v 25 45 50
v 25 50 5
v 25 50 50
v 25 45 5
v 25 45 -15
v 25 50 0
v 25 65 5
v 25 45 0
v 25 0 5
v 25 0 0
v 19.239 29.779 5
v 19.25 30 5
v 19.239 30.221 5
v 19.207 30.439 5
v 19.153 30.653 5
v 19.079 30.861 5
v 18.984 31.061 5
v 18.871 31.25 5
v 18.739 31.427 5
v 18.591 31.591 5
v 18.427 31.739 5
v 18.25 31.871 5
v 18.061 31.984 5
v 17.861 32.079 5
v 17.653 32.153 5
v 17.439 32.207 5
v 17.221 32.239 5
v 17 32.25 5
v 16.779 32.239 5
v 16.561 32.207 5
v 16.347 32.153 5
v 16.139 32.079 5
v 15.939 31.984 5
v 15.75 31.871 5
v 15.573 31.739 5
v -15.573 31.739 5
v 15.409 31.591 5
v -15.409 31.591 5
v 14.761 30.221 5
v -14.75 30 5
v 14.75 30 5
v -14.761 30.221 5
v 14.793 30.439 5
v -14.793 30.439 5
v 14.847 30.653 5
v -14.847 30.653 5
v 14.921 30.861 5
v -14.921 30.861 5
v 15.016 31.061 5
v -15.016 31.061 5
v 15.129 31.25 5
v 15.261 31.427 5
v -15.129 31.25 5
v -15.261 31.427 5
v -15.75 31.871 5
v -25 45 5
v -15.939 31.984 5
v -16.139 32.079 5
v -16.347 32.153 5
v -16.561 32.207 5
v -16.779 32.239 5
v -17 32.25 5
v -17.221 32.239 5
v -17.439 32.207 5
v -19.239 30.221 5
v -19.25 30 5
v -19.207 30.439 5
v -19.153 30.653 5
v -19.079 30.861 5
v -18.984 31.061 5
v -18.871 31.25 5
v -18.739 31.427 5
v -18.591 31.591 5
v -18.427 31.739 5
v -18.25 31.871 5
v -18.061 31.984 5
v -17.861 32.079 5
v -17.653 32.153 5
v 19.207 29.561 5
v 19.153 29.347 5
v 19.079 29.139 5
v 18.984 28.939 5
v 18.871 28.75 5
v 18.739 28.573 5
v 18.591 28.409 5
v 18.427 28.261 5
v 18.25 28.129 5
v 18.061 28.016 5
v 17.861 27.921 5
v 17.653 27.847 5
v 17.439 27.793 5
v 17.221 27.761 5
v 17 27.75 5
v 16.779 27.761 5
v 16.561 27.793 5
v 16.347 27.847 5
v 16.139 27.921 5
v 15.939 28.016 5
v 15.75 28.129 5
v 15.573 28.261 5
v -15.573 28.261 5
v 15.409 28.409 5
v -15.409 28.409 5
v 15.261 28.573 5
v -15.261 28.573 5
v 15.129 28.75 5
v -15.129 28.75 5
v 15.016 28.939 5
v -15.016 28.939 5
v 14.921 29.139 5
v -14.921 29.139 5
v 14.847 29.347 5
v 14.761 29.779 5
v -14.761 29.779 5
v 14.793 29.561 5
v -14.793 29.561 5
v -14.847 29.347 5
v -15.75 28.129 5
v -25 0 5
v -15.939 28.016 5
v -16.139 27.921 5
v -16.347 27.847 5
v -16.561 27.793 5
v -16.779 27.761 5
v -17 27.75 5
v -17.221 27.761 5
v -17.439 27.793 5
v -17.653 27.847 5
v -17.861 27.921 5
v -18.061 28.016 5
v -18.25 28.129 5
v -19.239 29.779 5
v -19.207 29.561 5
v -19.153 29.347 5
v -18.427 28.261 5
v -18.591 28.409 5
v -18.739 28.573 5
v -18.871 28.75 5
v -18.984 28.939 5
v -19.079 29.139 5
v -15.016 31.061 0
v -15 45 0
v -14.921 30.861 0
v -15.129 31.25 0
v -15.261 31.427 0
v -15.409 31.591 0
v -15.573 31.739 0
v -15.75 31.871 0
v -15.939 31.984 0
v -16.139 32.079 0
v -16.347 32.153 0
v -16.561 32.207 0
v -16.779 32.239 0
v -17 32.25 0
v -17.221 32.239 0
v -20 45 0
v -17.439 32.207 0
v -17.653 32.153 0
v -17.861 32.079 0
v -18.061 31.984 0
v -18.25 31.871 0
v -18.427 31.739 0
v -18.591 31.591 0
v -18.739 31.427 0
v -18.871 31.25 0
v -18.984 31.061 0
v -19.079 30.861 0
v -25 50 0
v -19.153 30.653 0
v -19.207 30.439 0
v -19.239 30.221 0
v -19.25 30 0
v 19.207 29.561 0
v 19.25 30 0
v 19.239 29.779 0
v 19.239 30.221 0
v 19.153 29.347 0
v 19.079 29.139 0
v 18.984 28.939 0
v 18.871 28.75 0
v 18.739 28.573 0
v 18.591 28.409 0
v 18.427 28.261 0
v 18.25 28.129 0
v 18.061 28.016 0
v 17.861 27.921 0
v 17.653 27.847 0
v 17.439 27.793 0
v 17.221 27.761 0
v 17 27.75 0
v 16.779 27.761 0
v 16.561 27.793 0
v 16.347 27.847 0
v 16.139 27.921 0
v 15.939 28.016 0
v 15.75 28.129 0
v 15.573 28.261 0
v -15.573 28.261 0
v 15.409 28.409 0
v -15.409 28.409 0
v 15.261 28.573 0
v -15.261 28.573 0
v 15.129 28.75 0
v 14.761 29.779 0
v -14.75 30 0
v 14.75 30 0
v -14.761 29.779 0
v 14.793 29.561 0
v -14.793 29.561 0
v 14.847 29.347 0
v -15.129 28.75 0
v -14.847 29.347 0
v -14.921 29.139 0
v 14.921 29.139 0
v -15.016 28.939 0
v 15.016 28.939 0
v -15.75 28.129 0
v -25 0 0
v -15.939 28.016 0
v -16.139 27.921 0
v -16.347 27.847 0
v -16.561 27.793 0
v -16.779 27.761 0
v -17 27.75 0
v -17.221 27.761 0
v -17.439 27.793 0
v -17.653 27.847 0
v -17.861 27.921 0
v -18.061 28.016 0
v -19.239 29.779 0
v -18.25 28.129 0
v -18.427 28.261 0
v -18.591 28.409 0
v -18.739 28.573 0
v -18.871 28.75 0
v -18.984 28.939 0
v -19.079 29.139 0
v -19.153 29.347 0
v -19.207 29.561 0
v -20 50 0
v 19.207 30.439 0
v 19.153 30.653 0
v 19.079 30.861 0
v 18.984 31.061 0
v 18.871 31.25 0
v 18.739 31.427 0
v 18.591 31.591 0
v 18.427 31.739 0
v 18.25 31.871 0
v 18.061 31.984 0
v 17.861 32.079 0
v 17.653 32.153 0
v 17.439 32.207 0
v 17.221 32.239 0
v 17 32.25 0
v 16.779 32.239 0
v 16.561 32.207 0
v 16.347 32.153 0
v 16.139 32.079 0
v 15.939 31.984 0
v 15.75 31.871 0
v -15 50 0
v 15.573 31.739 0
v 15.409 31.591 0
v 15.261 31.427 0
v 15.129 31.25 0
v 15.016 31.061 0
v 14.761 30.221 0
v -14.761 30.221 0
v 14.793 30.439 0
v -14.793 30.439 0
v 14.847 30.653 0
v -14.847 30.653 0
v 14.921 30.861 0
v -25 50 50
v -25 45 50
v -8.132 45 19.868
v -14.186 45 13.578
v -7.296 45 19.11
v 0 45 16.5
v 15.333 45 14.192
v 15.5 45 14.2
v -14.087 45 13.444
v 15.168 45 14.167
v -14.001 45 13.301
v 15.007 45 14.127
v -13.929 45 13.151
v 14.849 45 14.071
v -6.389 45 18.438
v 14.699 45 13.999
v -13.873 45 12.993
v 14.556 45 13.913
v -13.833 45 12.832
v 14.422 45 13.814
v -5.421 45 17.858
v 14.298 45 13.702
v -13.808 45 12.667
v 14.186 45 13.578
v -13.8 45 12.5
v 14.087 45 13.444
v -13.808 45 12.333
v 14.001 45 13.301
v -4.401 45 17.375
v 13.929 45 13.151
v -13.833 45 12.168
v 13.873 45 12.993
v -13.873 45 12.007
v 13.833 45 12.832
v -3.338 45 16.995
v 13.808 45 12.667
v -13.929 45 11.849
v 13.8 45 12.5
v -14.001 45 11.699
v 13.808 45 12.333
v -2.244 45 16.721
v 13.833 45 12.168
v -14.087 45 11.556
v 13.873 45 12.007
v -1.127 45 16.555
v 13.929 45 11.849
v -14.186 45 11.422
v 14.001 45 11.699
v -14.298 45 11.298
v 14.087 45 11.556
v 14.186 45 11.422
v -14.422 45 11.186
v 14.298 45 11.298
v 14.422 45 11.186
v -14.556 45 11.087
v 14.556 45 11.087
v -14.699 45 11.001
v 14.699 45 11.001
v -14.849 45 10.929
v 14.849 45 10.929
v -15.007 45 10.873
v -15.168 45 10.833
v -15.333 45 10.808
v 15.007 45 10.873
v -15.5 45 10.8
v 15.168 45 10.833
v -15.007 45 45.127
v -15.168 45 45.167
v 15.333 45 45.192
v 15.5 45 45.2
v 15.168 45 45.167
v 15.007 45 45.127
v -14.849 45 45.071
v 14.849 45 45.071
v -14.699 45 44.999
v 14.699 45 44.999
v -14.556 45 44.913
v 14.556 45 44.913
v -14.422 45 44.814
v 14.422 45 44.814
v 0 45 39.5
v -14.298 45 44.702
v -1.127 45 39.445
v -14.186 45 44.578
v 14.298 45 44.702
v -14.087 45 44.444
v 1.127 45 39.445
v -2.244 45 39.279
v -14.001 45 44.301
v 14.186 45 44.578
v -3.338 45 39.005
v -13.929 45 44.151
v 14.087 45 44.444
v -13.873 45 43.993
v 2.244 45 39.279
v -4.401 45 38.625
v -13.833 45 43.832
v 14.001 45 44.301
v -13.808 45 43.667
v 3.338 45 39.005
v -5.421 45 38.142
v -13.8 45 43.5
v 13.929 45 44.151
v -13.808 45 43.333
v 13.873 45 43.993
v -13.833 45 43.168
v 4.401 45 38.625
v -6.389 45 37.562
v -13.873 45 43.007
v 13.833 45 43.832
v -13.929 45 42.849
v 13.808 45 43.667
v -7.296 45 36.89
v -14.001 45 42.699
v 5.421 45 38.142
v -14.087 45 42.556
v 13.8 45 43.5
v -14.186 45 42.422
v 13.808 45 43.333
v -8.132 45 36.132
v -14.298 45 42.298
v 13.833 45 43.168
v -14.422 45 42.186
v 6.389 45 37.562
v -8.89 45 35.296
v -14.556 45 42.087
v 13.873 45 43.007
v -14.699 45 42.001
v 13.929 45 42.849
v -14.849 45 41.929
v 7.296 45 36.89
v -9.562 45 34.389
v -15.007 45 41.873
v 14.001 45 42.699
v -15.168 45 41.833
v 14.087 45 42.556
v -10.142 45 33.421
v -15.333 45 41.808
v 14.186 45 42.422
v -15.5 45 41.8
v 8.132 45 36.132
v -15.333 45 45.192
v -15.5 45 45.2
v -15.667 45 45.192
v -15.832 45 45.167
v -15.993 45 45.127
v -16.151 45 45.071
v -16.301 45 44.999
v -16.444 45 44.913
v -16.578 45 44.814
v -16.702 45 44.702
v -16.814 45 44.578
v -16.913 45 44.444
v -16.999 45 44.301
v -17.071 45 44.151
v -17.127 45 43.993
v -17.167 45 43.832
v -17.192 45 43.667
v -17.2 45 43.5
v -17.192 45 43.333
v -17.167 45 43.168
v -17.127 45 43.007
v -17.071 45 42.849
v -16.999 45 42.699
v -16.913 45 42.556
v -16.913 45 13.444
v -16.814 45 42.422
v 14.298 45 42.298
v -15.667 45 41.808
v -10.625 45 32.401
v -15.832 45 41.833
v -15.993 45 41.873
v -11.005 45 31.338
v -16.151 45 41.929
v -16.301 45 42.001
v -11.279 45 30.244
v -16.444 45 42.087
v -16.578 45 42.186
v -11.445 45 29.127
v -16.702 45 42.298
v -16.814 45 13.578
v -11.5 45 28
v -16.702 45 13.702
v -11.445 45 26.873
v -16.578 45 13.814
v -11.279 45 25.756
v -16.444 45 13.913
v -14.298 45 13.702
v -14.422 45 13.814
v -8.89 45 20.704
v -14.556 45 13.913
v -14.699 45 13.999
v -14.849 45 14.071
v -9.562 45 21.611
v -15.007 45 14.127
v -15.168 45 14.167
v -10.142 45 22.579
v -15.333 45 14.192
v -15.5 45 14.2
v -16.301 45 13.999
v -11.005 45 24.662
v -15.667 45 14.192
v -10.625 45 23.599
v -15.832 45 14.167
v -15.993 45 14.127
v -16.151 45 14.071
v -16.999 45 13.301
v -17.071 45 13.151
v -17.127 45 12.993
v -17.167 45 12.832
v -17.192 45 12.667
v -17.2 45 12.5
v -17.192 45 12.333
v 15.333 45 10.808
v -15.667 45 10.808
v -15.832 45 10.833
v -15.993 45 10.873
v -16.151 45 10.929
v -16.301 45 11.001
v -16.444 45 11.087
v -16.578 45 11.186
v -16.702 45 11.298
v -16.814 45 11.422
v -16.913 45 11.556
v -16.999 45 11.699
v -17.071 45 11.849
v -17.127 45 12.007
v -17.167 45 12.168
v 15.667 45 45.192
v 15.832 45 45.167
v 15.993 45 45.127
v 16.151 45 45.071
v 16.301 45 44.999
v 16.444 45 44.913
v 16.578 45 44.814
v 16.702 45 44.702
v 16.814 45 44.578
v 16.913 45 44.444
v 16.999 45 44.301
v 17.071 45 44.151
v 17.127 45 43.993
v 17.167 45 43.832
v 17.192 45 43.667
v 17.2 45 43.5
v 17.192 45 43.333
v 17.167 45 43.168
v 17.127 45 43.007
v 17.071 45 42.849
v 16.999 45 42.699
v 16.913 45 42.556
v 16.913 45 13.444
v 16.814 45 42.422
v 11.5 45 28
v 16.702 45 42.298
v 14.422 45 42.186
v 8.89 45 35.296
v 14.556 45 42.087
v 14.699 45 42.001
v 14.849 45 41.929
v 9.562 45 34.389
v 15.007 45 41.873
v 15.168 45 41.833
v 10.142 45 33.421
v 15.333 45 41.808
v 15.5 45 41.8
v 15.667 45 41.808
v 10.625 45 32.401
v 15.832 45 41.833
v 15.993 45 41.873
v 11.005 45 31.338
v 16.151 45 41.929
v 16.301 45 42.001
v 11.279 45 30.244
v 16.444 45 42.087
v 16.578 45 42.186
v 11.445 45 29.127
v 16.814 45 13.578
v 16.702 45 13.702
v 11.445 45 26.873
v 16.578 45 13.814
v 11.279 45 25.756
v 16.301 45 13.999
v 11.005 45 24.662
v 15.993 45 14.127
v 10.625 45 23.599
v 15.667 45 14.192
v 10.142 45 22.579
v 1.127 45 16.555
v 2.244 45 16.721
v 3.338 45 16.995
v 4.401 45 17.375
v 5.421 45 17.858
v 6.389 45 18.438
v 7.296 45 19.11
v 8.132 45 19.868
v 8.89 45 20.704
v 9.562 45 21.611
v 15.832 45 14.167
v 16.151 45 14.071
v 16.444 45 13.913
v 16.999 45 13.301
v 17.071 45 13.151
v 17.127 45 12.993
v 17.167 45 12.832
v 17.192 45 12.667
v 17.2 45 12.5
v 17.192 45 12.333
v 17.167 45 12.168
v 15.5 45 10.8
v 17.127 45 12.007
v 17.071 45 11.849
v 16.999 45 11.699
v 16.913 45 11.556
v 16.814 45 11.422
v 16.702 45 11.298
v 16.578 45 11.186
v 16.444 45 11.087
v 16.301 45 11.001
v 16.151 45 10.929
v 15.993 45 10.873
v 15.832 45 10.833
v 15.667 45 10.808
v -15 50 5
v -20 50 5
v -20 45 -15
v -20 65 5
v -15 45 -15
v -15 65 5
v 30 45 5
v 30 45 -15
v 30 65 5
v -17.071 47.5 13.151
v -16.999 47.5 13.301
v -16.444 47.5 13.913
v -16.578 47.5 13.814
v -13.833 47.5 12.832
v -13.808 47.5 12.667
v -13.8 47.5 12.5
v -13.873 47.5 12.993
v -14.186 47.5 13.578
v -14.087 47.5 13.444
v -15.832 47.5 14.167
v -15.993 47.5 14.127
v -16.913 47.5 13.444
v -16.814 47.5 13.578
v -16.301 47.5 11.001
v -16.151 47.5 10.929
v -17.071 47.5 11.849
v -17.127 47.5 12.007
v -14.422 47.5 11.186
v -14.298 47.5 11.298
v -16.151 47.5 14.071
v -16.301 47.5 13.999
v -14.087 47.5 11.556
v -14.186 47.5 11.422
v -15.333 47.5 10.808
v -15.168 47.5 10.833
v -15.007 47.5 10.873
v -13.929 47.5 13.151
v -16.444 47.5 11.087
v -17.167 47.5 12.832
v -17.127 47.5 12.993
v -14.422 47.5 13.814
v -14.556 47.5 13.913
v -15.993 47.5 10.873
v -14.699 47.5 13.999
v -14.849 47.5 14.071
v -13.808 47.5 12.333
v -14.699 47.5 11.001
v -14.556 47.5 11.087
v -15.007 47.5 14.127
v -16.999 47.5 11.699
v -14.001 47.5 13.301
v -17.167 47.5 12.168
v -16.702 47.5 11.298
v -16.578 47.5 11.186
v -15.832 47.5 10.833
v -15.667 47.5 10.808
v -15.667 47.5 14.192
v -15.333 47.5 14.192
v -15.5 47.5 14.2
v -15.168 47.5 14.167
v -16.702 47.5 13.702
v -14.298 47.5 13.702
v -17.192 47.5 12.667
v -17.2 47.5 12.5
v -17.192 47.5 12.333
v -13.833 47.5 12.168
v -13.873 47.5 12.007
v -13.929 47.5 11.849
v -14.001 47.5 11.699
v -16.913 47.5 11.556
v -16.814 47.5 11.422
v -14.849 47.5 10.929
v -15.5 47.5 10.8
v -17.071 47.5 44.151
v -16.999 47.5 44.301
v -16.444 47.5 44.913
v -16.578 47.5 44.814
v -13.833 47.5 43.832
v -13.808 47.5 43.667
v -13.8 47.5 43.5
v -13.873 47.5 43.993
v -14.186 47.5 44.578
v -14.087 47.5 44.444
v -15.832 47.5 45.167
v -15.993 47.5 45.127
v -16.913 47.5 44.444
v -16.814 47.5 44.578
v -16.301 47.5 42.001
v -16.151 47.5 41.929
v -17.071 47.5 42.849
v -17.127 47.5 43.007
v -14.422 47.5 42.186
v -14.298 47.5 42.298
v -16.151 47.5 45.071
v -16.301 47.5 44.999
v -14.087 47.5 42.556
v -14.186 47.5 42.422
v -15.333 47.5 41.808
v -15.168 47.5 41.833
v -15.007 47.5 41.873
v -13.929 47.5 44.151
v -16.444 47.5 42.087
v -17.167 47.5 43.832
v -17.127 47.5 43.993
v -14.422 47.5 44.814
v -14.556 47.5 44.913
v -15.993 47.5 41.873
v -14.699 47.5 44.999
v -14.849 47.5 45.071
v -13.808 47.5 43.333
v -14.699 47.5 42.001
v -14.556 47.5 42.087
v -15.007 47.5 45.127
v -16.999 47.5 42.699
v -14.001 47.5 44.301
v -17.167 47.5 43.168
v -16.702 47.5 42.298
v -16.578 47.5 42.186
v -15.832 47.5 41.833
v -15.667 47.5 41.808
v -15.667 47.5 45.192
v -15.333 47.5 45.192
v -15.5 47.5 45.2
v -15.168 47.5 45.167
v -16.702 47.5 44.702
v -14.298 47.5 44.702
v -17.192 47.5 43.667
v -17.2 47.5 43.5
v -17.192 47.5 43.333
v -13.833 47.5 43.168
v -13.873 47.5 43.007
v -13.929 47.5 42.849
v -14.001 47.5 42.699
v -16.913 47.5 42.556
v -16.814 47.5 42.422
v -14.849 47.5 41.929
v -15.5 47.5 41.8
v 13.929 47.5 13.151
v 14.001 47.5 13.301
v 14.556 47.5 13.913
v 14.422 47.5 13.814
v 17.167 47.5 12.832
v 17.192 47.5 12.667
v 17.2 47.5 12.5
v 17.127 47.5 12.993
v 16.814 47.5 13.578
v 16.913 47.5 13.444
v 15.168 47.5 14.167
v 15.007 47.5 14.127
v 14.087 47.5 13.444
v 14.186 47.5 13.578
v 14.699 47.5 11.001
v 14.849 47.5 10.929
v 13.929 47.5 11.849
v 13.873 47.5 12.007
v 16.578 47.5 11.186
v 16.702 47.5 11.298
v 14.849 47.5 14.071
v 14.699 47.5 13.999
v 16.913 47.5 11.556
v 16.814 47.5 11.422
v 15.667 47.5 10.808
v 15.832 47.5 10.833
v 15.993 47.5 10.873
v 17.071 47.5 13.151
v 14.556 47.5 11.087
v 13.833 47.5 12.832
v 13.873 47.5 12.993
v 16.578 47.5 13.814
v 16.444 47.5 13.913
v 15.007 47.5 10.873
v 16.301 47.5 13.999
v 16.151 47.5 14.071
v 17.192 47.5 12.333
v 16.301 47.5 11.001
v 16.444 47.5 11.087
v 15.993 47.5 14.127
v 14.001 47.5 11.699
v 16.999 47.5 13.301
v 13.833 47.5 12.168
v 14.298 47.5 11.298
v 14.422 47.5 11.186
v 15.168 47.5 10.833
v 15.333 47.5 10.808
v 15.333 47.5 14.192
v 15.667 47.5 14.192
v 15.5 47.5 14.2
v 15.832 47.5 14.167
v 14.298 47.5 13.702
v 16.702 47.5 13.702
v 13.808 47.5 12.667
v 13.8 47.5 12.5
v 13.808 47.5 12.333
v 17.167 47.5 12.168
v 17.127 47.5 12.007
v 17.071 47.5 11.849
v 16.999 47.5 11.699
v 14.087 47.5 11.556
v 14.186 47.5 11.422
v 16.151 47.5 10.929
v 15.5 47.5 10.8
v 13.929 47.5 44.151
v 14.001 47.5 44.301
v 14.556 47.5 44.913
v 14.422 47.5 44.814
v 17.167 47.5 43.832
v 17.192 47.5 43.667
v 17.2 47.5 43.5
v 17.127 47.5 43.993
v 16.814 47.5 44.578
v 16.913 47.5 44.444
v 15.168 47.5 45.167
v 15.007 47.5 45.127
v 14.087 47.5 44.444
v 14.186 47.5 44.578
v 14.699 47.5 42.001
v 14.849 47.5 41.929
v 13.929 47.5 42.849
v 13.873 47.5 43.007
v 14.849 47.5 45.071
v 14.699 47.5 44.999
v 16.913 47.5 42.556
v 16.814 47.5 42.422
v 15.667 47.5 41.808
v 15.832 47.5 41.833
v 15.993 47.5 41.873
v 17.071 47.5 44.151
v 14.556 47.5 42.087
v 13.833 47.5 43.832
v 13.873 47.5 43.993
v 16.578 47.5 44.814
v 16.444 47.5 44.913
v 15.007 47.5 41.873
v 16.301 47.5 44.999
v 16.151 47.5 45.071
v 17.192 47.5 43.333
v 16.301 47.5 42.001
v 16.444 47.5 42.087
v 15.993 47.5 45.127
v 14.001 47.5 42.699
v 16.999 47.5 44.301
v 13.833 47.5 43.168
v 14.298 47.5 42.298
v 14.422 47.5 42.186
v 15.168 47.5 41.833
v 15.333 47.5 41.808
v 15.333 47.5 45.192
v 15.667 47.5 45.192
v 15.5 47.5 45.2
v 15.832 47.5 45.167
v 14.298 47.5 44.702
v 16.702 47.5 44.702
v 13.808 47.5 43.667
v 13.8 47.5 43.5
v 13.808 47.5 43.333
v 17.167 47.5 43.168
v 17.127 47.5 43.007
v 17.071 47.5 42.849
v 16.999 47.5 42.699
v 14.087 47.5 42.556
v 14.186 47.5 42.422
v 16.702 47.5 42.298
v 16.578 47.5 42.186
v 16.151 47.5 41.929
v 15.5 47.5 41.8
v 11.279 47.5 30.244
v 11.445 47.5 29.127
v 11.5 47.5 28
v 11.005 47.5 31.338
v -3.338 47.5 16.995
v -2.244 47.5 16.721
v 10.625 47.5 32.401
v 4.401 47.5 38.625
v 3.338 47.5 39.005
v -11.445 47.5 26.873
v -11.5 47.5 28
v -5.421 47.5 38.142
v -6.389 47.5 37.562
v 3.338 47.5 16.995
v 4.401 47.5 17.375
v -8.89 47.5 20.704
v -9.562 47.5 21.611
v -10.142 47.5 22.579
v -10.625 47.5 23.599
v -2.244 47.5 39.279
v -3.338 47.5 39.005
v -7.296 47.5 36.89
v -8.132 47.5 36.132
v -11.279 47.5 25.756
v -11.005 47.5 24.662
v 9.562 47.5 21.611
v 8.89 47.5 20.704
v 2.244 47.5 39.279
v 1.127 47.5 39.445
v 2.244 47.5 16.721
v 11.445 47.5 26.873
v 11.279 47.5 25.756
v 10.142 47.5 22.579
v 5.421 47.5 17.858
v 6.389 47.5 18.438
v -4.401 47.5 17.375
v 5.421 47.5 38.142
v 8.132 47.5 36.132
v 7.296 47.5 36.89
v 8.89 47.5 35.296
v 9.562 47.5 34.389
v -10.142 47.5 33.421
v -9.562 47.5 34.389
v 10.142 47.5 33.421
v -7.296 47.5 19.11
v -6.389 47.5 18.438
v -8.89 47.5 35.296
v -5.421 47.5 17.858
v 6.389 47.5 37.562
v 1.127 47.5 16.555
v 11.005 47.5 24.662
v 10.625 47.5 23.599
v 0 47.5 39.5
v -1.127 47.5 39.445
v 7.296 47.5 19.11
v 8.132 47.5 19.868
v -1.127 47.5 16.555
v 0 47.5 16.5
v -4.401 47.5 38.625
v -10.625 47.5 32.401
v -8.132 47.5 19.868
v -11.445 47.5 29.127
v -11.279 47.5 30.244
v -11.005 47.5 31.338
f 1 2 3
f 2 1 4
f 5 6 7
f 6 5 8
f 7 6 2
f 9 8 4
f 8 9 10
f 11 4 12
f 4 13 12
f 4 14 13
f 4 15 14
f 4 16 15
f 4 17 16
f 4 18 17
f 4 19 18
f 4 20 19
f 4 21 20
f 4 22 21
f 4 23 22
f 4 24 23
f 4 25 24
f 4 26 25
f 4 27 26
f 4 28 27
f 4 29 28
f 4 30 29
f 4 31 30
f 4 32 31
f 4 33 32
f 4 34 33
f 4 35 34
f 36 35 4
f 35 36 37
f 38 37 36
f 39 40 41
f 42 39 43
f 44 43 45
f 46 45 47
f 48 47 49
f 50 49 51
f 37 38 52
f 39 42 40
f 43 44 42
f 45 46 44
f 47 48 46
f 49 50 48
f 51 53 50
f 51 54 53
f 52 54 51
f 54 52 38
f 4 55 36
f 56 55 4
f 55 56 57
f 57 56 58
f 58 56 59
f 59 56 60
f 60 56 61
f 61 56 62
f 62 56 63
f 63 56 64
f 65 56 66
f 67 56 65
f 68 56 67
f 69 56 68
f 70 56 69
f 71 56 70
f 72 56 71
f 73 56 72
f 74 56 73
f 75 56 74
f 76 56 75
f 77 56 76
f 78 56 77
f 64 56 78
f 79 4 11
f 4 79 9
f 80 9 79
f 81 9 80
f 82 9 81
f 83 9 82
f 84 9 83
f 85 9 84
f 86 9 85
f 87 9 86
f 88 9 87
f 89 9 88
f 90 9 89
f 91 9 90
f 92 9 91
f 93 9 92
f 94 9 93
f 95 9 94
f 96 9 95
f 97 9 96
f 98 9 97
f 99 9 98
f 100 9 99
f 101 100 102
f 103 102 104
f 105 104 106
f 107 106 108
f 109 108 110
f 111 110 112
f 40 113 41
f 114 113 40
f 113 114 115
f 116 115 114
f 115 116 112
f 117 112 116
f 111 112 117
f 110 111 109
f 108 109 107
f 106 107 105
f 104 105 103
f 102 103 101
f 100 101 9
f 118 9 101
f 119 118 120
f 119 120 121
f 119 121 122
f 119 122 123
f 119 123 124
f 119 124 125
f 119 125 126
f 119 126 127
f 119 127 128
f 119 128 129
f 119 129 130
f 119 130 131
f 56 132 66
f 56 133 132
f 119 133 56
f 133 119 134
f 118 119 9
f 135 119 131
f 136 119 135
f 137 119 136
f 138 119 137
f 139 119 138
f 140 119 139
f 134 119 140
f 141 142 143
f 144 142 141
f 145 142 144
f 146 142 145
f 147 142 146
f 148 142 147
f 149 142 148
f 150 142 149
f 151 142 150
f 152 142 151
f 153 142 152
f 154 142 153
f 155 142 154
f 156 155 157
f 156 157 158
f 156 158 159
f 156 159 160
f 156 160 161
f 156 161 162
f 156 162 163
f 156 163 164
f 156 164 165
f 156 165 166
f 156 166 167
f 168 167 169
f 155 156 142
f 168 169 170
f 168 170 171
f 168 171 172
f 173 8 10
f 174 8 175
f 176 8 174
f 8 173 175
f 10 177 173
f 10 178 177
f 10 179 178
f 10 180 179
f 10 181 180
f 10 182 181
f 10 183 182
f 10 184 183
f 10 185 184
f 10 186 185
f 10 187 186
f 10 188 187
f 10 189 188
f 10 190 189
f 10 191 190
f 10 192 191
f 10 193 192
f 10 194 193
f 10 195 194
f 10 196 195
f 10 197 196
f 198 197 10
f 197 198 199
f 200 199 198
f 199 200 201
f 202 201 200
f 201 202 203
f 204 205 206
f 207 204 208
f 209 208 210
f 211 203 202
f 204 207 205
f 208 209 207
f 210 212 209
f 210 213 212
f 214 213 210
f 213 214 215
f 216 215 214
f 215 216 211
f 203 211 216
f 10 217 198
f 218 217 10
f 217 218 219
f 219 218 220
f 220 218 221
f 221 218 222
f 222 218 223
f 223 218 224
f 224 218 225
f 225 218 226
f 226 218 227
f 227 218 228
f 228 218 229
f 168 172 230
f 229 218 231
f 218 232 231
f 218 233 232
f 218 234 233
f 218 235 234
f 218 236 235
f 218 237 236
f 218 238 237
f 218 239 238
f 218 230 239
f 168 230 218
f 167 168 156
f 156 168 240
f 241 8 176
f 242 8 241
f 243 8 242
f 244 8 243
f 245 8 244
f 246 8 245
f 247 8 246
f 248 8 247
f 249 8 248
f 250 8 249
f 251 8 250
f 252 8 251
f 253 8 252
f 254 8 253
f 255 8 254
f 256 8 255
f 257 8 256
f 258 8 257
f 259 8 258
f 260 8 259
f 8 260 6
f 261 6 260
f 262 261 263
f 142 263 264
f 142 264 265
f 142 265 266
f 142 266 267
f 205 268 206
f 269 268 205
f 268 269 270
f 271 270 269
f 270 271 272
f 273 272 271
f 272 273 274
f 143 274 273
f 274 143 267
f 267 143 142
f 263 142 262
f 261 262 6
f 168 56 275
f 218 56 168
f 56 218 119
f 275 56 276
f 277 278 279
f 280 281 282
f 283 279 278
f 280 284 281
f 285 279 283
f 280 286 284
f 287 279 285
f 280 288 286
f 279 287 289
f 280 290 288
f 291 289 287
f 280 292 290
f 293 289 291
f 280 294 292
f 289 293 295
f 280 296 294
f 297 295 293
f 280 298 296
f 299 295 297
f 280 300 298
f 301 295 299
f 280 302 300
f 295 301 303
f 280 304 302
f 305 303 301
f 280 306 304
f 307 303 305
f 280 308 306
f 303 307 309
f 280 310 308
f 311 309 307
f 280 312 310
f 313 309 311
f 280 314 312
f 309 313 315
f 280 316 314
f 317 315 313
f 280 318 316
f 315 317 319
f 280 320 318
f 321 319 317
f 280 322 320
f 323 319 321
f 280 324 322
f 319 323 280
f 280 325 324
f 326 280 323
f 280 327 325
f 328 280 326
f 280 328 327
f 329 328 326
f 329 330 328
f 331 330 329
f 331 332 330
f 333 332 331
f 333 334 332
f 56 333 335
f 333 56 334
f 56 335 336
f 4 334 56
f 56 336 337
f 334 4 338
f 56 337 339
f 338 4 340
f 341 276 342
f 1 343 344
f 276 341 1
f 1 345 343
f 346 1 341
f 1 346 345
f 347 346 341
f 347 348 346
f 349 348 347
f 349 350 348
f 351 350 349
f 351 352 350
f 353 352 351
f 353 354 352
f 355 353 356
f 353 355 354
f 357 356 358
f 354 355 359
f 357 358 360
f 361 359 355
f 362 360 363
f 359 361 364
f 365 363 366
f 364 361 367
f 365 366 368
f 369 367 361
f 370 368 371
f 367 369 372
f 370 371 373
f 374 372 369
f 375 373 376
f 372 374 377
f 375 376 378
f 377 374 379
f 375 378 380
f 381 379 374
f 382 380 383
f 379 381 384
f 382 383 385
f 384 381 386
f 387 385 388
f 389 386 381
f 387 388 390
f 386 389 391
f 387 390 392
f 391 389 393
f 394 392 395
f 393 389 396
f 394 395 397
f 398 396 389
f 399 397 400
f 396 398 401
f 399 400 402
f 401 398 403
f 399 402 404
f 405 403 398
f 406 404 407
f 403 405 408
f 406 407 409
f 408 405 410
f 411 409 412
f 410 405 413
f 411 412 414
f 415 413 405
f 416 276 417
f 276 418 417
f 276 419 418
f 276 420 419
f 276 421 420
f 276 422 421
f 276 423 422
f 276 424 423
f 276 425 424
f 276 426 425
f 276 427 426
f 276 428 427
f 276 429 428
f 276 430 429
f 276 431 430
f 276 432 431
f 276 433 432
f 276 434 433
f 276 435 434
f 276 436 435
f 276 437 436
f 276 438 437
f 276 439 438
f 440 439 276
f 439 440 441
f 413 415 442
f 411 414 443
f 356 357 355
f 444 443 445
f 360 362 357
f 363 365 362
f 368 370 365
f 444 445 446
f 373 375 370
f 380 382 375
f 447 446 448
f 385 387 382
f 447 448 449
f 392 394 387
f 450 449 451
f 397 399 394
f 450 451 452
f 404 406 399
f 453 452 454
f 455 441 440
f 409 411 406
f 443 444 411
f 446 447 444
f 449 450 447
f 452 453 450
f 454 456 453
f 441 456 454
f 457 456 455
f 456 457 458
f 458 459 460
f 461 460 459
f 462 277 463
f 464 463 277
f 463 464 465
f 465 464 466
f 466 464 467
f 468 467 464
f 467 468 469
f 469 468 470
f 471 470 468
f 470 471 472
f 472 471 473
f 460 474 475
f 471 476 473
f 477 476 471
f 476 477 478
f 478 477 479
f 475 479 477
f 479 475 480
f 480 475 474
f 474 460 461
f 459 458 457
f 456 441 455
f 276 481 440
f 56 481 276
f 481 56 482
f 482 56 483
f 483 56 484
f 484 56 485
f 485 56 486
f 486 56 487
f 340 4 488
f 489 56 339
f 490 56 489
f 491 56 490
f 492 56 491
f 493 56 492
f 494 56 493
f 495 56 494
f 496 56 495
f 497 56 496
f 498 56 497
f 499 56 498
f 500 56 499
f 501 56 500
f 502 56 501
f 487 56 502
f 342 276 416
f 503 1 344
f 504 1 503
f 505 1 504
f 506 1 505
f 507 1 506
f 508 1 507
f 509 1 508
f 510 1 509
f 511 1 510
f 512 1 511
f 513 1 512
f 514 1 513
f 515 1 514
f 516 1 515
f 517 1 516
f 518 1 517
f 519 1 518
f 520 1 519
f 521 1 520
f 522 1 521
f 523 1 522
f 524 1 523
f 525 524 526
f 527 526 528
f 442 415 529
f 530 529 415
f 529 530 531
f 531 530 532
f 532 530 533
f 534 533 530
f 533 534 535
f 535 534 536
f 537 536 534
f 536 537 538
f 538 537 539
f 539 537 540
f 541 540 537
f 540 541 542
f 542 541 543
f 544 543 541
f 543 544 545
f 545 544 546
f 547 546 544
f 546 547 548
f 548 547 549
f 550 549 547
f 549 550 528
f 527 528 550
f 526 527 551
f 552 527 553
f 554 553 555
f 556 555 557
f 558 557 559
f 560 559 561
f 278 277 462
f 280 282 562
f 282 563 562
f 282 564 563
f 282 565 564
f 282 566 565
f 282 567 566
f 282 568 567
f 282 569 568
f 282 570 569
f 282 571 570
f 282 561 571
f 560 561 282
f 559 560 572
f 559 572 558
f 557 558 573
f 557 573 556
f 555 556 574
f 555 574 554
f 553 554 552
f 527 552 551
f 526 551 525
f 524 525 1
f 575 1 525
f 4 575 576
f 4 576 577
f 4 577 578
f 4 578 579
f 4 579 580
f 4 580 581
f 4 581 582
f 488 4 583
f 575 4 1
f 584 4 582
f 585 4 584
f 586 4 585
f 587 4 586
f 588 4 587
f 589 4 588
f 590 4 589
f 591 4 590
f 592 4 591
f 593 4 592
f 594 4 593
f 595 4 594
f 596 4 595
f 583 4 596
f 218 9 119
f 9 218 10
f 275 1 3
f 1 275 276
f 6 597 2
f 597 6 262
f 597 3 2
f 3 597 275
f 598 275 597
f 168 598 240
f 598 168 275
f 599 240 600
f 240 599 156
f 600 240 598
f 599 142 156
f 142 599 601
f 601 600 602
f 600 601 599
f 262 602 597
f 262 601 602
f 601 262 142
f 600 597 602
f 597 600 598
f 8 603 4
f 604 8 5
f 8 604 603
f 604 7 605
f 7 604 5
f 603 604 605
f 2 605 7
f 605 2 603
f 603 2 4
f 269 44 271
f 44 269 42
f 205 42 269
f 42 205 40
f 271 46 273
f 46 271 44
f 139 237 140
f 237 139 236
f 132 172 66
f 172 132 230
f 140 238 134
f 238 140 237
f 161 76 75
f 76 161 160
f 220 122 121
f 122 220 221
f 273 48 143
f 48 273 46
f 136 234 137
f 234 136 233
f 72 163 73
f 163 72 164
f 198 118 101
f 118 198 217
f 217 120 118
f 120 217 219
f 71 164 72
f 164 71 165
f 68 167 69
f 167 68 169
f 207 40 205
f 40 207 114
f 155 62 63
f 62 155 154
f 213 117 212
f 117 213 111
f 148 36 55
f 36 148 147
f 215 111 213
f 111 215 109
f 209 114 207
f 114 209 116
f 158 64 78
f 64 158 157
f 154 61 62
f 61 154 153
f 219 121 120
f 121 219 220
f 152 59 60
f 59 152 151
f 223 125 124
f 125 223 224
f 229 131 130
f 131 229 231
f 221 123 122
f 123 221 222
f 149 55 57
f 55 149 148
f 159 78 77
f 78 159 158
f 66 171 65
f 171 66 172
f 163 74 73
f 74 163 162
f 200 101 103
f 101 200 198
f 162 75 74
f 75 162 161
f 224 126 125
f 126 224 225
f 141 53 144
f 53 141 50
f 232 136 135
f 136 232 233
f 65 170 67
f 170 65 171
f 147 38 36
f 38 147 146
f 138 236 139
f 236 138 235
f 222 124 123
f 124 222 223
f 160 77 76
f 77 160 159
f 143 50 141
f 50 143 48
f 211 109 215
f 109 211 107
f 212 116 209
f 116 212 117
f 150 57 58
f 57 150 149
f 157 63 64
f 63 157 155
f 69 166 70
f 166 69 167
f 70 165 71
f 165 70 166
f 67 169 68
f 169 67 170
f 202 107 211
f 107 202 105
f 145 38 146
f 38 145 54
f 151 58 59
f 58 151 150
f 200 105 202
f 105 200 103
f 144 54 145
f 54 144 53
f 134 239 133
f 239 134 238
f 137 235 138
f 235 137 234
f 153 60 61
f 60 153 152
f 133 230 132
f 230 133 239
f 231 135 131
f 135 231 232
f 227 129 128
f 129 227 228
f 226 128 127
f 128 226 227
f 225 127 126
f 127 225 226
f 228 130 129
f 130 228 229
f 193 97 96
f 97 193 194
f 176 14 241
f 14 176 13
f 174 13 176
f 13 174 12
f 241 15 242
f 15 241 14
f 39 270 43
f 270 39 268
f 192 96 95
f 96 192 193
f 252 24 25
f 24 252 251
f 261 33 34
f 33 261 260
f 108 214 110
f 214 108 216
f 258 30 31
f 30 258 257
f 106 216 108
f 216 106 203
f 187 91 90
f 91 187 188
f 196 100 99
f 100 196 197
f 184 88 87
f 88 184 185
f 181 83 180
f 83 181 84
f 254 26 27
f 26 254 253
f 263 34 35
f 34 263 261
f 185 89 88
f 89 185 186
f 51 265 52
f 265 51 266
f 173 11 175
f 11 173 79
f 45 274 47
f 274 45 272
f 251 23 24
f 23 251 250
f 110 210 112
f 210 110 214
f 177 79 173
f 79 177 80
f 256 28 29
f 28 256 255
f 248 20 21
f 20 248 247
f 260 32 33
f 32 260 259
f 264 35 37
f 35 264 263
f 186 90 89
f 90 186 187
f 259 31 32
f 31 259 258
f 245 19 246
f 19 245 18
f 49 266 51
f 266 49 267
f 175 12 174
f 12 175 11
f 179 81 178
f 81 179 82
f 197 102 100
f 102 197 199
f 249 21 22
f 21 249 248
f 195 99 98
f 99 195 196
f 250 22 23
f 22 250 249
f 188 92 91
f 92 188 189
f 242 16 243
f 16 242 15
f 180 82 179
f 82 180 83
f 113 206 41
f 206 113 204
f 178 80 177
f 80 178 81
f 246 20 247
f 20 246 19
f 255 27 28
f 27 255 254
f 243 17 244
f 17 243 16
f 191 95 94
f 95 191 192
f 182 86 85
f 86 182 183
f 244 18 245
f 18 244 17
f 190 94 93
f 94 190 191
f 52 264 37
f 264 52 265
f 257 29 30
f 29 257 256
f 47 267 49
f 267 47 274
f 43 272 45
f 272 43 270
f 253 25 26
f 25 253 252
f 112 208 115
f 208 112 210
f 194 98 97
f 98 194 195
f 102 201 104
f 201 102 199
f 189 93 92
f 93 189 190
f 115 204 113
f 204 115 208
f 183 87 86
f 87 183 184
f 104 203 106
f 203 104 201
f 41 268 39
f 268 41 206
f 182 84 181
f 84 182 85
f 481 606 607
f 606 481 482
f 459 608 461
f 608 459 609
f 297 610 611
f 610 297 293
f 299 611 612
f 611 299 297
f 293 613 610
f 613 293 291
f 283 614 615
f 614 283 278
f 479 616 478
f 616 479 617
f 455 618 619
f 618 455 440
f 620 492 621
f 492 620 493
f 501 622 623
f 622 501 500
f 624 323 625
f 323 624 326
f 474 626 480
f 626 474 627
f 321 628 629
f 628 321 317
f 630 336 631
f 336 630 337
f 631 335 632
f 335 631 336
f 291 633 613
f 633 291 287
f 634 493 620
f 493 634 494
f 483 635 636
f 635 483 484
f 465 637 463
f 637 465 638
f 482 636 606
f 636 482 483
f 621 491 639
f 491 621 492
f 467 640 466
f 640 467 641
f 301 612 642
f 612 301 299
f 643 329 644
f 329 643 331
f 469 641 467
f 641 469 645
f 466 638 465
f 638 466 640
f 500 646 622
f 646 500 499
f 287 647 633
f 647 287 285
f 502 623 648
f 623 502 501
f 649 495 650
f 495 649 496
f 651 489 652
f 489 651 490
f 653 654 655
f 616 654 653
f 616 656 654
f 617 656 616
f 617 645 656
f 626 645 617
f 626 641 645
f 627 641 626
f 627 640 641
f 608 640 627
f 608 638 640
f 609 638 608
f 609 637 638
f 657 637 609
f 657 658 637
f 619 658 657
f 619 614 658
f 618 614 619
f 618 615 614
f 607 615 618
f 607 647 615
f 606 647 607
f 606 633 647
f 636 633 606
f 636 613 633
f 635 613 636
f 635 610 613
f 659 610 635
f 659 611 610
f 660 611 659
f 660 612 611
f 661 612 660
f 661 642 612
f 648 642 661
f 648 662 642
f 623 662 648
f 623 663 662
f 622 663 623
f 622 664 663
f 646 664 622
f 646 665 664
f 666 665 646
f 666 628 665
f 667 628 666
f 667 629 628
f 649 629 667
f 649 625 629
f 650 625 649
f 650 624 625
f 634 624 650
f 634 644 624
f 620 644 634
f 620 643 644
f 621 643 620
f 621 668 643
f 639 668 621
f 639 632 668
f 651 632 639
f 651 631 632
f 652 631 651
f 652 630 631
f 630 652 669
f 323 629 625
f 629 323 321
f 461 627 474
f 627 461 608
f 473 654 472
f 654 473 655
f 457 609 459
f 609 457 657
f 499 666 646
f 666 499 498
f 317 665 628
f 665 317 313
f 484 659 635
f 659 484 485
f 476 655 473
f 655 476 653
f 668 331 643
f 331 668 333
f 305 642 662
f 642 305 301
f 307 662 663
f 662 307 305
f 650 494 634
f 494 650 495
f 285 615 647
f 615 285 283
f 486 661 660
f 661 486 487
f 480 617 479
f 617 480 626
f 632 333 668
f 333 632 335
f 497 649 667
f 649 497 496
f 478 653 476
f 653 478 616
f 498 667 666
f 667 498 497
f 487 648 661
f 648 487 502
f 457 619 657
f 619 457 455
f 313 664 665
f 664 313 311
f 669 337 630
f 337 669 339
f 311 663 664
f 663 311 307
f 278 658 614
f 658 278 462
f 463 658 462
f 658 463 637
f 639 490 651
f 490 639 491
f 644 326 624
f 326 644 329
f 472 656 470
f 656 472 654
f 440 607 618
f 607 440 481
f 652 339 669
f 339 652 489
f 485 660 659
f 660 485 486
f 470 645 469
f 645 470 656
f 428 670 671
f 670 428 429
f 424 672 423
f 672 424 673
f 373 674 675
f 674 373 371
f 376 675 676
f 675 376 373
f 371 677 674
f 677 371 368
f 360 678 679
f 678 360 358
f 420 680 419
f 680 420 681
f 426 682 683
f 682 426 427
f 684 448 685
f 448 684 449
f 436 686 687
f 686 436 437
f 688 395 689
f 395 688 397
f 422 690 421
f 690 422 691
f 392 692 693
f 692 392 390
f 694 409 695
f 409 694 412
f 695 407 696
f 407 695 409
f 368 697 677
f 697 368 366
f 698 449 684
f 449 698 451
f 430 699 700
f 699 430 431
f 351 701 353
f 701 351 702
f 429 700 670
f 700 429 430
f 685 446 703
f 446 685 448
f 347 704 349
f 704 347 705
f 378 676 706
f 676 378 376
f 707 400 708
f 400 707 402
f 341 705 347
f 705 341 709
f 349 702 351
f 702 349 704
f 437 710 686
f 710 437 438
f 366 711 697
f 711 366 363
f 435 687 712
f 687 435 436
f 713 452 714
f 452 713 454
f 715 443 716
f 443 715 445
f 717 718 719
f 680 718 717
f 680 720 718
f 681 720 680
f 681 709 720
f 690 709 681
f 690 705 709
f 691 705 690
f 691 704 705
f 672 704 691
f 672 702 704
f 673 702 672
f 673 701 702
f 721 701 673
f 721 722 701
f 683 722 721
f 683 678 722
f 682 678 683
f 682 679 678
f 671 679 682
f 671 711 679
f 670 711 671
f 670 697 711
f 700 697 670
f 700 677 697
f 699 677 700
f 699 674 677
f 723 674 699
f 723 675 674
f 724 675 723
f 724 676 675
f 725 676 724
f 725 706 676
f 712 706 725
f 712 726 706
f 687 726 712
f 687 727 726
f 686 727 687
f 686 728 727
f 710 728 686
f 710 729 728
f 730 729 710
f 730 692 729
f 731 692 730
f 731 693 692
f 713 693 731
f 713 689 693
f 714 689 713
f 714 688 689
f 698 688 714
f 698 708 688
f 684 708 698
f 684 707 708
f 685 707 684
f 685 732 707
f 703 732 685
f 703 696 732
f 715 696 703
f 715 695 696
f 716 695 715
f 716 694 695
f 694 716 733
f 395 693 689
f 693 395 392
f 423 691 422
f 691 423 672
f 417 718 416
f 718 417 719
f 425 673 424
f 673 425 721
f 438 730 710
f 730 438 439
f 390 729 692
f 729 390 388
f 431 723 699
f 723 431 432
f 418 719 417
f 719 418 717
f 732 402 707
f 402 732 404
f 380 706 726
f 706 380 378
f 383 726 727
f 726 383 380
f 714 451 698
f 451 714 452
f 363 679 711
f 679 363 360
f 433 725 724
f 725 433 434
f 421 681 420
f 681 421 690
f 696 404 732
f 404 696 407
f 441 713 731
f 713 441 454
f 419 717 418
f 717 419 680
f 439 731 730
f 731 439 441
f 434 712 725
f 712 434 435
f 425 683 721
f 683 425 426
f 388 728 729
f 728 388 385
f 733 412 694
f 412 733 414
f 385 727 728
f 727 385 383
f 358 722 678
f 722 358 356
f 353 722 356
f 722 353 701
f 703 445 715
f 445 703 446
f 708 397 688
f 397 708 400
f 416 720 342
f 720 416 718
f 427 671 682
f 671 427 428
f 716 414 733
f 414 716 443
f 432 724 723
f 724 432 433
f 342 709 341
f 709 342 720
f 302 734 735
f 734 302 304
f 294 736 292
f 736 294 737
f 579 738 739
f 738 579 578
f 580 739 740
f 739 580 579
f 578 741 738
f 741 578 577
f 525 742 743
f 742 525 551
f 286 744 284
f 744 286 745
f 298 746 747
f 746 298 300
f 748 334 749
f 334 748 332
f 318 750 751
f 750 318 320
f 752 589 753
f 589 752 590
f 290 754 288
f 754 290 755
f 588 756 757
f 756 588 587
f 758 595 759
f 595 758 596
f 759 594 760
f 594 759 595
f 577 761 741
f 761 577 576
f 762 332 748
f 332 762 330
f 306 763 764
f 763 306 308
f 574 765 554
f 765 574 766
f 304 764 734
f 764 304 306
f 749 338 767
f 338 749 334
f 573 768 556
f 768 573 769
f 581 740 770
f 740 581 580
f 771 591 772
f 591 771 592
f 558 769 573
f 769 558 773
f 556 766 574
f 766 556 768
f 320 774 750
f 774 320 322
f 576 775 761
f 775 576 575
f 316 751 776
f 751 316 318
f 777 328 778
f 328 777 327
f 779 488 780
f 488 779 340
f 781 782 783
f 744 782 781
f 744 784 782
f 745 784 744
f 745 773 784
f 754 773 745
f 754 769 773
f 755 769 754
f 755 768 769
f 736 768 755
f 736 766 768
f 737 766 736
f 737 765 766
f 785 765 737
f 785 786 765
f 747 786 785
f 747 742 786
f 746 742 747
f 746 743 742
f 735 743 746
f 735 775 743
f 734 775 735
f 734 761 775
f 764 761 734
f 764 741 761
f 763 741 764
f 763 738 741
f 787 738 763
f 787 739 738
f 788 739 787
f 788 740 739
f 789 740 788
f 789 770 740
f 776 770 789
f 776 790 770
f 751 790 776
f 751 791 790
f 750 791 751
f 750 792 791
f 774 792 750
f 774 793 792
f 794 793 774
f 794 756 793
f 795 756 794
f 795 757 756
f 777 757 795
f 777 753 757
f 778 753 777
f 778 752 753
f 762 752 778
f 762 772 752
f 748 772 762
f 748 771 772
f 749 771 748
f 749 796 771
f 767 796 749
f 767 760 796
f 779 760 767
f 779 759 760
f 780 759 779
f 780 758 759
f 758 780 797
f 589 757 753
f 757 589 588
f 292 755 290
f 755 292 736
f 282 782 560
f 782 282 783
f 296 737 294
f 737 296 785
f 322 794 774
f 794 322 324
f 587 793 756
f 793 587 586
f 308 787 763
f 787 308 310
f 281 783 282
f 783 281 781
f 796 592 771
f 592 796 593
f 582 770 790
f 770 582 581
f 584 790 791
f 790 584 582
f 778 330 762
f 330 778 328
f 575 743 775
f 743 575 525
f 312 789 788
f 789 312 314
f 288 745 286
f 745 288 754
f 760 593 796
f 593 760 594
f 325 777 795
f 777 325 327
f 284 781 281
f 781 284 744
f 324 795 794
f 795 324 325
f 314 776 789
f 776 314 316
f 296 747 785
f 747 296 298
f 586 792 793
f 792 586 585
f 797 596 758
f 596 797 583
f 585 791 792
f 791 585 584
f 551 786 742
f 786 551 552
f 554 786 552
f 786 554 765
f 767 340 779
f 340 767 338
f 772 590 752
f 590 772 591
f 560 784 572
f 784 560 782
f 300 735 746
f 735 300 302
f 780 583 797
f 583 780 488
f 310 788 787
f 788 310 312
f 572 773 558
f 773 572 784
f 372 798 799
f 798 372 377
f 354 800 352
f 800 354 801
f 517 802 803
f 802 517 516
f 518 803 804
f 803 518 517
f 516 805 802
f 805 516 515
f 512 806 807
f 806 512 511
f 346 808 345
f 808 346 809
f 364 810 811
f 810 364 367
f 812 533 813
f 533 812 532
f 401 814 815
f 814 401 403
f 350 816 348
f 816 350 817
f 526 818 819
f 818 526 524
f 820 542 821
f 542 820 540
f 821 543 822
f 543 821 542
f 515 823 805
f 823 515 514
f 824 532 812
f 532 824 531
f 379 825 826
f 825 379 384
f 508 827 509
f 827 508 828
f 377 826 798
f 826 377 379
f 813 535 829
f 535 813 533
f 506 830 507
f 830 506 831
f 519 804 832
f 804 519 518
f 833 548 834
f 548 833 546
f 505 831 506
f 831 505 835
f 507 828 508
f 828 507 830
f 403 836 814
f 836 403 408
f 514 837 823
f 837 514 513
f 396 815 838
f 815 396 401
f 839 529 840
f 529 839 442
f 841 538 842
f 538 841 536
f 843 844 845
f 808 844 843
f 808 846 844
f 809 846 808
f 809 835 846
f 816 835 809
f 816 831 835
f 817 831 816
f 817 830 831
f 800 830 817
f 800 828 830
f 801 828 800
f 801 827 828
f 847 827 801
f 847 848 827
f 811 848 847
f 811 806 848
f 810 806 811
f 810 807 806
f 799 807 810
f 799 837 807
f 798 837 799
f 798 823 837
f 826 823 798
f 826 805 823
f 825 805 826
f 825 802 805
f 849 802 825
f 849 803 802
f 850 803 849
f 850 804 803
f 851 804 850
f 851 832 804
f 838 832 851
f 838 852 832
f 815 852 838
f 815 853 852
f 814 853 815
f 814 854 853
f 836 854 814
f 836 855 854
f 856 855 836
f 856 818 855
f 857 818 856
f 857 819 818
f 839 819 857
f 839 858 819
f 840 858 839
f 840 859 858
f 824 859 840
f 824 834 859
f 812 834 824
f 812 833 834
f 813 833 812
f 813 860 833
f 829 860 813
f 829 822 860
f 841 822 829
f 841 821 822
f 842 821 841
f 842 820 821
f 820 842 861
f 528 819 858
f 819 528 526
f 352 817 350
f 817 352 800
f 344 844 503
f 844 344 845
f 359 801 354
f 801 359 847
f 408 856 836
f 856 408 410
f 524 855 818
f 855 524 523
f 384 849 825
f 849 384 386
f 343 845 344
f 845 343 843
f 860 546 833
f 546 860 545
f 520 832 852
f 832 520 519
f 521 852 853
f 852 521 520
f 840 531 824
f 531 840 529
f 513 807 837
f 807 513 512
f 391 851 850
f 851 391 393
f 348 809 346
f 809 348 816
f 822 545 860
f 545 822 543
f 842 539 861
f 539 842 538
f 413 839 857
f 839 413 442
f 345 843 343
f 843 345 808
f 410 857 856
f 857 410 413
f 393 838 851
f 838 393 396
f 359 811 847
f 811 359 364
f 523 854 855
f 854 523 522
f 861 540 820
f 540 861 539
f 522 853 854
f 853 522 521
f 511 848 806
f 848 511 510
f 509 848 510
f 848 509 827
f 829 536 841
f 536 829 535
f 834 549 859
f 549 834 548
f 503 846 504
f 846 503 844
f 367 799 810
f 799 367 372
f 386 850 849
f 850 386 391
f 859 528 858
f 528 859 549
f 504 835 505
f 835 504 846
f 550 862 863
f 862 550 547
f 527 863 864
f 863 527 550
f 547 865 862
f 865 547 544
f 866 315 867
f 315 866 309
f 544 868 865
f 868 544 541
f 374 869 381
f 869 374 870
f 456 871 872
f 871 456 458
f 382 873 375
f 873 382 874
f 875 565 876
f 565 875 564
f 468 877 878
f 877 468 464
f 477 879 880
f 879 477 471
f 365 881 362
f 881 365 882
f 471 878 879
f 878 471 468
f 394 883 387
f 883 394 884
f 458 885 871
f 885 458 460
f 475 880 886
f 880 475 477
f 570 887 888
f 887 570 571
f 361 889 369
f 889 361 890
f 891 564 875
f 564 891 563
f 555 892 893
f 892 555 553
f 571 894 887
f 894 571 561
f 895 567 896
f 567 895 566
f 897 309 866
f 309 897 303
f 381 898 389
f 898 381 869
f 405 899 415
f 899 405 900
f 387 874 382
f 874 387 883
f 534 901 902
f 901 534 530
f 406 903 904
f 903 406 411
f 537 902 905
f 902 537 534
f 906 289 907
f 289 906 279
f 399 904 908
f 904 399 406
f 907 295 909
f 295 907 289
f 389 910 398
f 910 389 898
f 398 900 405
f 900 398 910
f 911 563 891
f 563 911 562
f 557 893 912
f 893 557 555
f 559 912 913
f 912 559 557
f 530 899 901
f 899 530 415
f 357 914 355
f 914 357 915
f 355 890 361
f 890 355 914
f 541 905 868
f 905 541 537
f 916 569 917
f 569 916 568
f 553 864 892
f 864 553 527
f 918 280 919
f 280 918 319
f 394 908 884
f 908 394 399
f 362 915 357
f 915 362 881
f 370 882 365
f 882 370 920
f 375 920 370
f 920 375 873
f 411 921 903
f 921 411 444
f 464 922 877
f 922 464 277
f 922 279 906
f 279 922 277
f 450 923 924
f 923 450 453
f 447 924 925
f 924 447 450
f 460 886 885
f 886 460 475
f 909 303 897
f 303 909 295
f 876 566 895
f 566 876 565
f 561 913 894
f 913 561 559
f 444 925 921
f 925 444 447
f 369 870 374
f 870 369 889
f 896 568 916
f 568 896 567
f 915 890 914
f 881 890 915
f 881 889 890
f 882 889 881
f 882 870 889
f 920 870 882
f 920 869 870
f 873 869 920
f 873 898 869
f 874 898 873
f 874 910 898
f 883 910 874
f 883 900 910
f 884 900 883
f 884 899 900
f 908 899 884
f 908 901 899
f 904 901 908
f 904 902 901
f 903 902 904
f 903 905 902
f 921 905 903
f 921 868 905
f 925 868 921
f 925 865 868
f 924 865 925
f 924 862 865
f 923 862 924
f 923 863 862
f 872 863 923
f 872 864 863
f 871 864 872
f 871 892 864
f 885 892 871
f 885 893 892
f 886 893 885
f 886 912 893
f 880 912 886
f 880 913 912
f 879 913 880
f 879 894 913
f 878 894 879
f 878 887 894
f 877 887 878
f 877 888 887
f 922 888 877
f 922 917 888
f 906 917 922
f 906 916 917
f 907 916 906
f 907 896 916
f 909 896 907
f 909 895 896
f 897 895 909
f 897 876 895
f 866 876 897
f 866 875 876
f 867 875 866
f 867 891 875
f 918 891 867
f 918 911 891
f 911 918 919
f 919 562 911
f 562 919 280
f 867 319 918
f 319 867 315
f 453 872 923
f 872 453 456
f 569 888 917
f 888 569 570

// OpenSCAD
// ------------------- Parameters (mm) -------------------
// Base plate
base_x = 50;          // width  (x: -25 .. 25)
base_y = 45;          // length (y: 0 .. 45)
base_z = 5;           // thickness

// Motor plate (vertical)
motor_x = 50;         // width (same as base)
motor_y = 5;          // thickness along Y (back edge of base)
motor_z = 50;        // height along Z

// Hole dimensions
m4_d = 4.5;           // M4 through‑hole diameter
m4_r = m4_d/2;

m3_d = 3.4;           // M3 screw hole diameter
m3_r = m3_d/2;

boss_d = 23;          // motor centring boss hole diameter
boss_r = boss_d/2;
boss_z = 28;         // Z centre of boss hole

// Gusset geometry
gusset_thick = 5;    // thickness in X direction
gusset_leg = 20;     // leg length in Y and Z

$fn = 64;            // resolution for circles/cylinders

// ------------------- Solid parts -------------------
module solid_parts() {
    union() {
        // Base plate (lies on the bed)
        translate([-25, 0, 0])
            cube([base_x, base_y, base_z], center = false);

        // Motor plate (standing on back edge of base)
        translate([-25, base_y, 0])   // y = 45 .. 50
            cube([motor_x, motor_y, motor_z], center = false);

        // Left triangular gusset
        translate([-25, base_y, base_z])   // corner at (x=-25, y=45, z=5)
            rotate([0, 90, 0])               // rotate so extrusion goes along X
                translate([0, 0, gusset_thick])   // shift Z to make all faces ≥0
                    linear_extrude(height = gusset_thick)
                        polygon(points = [[0,0], [gusset_leg,0], [0,gusset_leg]]);

        // Right triangular gusset
        translate([20, base_y, base_z])    // corner at (x=20, y=45, z=5)
            rotate([0, 90, 0])
                translate([0, 0, gusset_thick])
                    linear_extrude(height = gusset_thick)
                        polygon(points = [[0,0], [gusset_leg,0], [0,gusset_leg]]);
    }
}

// ------------------- Cutting features -------------------
module cut_features() {
    union() {
        // M4 through‑holes in base plate
        for (pos = [[-17,30], [17,30]]) {
            translate([pos[0], pos[1], -0.5])          // extend 0.5 mm below & above
                cylinder(r = m4_r, h = base_z + 1);
        }

        // Boss hole (oriented along Y) in motor plate
        translate([0, base_y + motor_y/2, boss_z])   // centre at y = 45 + 2.5 = 47.5
            rotate([90,0,0])                         // rotate cylinder to Y‑axis
                cylinder(r = boss_r, h = motor_y + 2); // extend 1 mm beyond each face

        // Four M3 screw holes (oriented along Y) in motor plate
        for (dx = [-15.5, 15.5])
            for (dz = [-15.5, 15.5])
                translate([dx, base_y + motor_y/2, boss_z + dz])
                    rotate([90,0,0])
                        cylinder(r = m3_r, h = motor_y + 2);
    }
}

// ------------------- Final model -------------------
difference() {
    solid_parts();
    cut_features();
}
